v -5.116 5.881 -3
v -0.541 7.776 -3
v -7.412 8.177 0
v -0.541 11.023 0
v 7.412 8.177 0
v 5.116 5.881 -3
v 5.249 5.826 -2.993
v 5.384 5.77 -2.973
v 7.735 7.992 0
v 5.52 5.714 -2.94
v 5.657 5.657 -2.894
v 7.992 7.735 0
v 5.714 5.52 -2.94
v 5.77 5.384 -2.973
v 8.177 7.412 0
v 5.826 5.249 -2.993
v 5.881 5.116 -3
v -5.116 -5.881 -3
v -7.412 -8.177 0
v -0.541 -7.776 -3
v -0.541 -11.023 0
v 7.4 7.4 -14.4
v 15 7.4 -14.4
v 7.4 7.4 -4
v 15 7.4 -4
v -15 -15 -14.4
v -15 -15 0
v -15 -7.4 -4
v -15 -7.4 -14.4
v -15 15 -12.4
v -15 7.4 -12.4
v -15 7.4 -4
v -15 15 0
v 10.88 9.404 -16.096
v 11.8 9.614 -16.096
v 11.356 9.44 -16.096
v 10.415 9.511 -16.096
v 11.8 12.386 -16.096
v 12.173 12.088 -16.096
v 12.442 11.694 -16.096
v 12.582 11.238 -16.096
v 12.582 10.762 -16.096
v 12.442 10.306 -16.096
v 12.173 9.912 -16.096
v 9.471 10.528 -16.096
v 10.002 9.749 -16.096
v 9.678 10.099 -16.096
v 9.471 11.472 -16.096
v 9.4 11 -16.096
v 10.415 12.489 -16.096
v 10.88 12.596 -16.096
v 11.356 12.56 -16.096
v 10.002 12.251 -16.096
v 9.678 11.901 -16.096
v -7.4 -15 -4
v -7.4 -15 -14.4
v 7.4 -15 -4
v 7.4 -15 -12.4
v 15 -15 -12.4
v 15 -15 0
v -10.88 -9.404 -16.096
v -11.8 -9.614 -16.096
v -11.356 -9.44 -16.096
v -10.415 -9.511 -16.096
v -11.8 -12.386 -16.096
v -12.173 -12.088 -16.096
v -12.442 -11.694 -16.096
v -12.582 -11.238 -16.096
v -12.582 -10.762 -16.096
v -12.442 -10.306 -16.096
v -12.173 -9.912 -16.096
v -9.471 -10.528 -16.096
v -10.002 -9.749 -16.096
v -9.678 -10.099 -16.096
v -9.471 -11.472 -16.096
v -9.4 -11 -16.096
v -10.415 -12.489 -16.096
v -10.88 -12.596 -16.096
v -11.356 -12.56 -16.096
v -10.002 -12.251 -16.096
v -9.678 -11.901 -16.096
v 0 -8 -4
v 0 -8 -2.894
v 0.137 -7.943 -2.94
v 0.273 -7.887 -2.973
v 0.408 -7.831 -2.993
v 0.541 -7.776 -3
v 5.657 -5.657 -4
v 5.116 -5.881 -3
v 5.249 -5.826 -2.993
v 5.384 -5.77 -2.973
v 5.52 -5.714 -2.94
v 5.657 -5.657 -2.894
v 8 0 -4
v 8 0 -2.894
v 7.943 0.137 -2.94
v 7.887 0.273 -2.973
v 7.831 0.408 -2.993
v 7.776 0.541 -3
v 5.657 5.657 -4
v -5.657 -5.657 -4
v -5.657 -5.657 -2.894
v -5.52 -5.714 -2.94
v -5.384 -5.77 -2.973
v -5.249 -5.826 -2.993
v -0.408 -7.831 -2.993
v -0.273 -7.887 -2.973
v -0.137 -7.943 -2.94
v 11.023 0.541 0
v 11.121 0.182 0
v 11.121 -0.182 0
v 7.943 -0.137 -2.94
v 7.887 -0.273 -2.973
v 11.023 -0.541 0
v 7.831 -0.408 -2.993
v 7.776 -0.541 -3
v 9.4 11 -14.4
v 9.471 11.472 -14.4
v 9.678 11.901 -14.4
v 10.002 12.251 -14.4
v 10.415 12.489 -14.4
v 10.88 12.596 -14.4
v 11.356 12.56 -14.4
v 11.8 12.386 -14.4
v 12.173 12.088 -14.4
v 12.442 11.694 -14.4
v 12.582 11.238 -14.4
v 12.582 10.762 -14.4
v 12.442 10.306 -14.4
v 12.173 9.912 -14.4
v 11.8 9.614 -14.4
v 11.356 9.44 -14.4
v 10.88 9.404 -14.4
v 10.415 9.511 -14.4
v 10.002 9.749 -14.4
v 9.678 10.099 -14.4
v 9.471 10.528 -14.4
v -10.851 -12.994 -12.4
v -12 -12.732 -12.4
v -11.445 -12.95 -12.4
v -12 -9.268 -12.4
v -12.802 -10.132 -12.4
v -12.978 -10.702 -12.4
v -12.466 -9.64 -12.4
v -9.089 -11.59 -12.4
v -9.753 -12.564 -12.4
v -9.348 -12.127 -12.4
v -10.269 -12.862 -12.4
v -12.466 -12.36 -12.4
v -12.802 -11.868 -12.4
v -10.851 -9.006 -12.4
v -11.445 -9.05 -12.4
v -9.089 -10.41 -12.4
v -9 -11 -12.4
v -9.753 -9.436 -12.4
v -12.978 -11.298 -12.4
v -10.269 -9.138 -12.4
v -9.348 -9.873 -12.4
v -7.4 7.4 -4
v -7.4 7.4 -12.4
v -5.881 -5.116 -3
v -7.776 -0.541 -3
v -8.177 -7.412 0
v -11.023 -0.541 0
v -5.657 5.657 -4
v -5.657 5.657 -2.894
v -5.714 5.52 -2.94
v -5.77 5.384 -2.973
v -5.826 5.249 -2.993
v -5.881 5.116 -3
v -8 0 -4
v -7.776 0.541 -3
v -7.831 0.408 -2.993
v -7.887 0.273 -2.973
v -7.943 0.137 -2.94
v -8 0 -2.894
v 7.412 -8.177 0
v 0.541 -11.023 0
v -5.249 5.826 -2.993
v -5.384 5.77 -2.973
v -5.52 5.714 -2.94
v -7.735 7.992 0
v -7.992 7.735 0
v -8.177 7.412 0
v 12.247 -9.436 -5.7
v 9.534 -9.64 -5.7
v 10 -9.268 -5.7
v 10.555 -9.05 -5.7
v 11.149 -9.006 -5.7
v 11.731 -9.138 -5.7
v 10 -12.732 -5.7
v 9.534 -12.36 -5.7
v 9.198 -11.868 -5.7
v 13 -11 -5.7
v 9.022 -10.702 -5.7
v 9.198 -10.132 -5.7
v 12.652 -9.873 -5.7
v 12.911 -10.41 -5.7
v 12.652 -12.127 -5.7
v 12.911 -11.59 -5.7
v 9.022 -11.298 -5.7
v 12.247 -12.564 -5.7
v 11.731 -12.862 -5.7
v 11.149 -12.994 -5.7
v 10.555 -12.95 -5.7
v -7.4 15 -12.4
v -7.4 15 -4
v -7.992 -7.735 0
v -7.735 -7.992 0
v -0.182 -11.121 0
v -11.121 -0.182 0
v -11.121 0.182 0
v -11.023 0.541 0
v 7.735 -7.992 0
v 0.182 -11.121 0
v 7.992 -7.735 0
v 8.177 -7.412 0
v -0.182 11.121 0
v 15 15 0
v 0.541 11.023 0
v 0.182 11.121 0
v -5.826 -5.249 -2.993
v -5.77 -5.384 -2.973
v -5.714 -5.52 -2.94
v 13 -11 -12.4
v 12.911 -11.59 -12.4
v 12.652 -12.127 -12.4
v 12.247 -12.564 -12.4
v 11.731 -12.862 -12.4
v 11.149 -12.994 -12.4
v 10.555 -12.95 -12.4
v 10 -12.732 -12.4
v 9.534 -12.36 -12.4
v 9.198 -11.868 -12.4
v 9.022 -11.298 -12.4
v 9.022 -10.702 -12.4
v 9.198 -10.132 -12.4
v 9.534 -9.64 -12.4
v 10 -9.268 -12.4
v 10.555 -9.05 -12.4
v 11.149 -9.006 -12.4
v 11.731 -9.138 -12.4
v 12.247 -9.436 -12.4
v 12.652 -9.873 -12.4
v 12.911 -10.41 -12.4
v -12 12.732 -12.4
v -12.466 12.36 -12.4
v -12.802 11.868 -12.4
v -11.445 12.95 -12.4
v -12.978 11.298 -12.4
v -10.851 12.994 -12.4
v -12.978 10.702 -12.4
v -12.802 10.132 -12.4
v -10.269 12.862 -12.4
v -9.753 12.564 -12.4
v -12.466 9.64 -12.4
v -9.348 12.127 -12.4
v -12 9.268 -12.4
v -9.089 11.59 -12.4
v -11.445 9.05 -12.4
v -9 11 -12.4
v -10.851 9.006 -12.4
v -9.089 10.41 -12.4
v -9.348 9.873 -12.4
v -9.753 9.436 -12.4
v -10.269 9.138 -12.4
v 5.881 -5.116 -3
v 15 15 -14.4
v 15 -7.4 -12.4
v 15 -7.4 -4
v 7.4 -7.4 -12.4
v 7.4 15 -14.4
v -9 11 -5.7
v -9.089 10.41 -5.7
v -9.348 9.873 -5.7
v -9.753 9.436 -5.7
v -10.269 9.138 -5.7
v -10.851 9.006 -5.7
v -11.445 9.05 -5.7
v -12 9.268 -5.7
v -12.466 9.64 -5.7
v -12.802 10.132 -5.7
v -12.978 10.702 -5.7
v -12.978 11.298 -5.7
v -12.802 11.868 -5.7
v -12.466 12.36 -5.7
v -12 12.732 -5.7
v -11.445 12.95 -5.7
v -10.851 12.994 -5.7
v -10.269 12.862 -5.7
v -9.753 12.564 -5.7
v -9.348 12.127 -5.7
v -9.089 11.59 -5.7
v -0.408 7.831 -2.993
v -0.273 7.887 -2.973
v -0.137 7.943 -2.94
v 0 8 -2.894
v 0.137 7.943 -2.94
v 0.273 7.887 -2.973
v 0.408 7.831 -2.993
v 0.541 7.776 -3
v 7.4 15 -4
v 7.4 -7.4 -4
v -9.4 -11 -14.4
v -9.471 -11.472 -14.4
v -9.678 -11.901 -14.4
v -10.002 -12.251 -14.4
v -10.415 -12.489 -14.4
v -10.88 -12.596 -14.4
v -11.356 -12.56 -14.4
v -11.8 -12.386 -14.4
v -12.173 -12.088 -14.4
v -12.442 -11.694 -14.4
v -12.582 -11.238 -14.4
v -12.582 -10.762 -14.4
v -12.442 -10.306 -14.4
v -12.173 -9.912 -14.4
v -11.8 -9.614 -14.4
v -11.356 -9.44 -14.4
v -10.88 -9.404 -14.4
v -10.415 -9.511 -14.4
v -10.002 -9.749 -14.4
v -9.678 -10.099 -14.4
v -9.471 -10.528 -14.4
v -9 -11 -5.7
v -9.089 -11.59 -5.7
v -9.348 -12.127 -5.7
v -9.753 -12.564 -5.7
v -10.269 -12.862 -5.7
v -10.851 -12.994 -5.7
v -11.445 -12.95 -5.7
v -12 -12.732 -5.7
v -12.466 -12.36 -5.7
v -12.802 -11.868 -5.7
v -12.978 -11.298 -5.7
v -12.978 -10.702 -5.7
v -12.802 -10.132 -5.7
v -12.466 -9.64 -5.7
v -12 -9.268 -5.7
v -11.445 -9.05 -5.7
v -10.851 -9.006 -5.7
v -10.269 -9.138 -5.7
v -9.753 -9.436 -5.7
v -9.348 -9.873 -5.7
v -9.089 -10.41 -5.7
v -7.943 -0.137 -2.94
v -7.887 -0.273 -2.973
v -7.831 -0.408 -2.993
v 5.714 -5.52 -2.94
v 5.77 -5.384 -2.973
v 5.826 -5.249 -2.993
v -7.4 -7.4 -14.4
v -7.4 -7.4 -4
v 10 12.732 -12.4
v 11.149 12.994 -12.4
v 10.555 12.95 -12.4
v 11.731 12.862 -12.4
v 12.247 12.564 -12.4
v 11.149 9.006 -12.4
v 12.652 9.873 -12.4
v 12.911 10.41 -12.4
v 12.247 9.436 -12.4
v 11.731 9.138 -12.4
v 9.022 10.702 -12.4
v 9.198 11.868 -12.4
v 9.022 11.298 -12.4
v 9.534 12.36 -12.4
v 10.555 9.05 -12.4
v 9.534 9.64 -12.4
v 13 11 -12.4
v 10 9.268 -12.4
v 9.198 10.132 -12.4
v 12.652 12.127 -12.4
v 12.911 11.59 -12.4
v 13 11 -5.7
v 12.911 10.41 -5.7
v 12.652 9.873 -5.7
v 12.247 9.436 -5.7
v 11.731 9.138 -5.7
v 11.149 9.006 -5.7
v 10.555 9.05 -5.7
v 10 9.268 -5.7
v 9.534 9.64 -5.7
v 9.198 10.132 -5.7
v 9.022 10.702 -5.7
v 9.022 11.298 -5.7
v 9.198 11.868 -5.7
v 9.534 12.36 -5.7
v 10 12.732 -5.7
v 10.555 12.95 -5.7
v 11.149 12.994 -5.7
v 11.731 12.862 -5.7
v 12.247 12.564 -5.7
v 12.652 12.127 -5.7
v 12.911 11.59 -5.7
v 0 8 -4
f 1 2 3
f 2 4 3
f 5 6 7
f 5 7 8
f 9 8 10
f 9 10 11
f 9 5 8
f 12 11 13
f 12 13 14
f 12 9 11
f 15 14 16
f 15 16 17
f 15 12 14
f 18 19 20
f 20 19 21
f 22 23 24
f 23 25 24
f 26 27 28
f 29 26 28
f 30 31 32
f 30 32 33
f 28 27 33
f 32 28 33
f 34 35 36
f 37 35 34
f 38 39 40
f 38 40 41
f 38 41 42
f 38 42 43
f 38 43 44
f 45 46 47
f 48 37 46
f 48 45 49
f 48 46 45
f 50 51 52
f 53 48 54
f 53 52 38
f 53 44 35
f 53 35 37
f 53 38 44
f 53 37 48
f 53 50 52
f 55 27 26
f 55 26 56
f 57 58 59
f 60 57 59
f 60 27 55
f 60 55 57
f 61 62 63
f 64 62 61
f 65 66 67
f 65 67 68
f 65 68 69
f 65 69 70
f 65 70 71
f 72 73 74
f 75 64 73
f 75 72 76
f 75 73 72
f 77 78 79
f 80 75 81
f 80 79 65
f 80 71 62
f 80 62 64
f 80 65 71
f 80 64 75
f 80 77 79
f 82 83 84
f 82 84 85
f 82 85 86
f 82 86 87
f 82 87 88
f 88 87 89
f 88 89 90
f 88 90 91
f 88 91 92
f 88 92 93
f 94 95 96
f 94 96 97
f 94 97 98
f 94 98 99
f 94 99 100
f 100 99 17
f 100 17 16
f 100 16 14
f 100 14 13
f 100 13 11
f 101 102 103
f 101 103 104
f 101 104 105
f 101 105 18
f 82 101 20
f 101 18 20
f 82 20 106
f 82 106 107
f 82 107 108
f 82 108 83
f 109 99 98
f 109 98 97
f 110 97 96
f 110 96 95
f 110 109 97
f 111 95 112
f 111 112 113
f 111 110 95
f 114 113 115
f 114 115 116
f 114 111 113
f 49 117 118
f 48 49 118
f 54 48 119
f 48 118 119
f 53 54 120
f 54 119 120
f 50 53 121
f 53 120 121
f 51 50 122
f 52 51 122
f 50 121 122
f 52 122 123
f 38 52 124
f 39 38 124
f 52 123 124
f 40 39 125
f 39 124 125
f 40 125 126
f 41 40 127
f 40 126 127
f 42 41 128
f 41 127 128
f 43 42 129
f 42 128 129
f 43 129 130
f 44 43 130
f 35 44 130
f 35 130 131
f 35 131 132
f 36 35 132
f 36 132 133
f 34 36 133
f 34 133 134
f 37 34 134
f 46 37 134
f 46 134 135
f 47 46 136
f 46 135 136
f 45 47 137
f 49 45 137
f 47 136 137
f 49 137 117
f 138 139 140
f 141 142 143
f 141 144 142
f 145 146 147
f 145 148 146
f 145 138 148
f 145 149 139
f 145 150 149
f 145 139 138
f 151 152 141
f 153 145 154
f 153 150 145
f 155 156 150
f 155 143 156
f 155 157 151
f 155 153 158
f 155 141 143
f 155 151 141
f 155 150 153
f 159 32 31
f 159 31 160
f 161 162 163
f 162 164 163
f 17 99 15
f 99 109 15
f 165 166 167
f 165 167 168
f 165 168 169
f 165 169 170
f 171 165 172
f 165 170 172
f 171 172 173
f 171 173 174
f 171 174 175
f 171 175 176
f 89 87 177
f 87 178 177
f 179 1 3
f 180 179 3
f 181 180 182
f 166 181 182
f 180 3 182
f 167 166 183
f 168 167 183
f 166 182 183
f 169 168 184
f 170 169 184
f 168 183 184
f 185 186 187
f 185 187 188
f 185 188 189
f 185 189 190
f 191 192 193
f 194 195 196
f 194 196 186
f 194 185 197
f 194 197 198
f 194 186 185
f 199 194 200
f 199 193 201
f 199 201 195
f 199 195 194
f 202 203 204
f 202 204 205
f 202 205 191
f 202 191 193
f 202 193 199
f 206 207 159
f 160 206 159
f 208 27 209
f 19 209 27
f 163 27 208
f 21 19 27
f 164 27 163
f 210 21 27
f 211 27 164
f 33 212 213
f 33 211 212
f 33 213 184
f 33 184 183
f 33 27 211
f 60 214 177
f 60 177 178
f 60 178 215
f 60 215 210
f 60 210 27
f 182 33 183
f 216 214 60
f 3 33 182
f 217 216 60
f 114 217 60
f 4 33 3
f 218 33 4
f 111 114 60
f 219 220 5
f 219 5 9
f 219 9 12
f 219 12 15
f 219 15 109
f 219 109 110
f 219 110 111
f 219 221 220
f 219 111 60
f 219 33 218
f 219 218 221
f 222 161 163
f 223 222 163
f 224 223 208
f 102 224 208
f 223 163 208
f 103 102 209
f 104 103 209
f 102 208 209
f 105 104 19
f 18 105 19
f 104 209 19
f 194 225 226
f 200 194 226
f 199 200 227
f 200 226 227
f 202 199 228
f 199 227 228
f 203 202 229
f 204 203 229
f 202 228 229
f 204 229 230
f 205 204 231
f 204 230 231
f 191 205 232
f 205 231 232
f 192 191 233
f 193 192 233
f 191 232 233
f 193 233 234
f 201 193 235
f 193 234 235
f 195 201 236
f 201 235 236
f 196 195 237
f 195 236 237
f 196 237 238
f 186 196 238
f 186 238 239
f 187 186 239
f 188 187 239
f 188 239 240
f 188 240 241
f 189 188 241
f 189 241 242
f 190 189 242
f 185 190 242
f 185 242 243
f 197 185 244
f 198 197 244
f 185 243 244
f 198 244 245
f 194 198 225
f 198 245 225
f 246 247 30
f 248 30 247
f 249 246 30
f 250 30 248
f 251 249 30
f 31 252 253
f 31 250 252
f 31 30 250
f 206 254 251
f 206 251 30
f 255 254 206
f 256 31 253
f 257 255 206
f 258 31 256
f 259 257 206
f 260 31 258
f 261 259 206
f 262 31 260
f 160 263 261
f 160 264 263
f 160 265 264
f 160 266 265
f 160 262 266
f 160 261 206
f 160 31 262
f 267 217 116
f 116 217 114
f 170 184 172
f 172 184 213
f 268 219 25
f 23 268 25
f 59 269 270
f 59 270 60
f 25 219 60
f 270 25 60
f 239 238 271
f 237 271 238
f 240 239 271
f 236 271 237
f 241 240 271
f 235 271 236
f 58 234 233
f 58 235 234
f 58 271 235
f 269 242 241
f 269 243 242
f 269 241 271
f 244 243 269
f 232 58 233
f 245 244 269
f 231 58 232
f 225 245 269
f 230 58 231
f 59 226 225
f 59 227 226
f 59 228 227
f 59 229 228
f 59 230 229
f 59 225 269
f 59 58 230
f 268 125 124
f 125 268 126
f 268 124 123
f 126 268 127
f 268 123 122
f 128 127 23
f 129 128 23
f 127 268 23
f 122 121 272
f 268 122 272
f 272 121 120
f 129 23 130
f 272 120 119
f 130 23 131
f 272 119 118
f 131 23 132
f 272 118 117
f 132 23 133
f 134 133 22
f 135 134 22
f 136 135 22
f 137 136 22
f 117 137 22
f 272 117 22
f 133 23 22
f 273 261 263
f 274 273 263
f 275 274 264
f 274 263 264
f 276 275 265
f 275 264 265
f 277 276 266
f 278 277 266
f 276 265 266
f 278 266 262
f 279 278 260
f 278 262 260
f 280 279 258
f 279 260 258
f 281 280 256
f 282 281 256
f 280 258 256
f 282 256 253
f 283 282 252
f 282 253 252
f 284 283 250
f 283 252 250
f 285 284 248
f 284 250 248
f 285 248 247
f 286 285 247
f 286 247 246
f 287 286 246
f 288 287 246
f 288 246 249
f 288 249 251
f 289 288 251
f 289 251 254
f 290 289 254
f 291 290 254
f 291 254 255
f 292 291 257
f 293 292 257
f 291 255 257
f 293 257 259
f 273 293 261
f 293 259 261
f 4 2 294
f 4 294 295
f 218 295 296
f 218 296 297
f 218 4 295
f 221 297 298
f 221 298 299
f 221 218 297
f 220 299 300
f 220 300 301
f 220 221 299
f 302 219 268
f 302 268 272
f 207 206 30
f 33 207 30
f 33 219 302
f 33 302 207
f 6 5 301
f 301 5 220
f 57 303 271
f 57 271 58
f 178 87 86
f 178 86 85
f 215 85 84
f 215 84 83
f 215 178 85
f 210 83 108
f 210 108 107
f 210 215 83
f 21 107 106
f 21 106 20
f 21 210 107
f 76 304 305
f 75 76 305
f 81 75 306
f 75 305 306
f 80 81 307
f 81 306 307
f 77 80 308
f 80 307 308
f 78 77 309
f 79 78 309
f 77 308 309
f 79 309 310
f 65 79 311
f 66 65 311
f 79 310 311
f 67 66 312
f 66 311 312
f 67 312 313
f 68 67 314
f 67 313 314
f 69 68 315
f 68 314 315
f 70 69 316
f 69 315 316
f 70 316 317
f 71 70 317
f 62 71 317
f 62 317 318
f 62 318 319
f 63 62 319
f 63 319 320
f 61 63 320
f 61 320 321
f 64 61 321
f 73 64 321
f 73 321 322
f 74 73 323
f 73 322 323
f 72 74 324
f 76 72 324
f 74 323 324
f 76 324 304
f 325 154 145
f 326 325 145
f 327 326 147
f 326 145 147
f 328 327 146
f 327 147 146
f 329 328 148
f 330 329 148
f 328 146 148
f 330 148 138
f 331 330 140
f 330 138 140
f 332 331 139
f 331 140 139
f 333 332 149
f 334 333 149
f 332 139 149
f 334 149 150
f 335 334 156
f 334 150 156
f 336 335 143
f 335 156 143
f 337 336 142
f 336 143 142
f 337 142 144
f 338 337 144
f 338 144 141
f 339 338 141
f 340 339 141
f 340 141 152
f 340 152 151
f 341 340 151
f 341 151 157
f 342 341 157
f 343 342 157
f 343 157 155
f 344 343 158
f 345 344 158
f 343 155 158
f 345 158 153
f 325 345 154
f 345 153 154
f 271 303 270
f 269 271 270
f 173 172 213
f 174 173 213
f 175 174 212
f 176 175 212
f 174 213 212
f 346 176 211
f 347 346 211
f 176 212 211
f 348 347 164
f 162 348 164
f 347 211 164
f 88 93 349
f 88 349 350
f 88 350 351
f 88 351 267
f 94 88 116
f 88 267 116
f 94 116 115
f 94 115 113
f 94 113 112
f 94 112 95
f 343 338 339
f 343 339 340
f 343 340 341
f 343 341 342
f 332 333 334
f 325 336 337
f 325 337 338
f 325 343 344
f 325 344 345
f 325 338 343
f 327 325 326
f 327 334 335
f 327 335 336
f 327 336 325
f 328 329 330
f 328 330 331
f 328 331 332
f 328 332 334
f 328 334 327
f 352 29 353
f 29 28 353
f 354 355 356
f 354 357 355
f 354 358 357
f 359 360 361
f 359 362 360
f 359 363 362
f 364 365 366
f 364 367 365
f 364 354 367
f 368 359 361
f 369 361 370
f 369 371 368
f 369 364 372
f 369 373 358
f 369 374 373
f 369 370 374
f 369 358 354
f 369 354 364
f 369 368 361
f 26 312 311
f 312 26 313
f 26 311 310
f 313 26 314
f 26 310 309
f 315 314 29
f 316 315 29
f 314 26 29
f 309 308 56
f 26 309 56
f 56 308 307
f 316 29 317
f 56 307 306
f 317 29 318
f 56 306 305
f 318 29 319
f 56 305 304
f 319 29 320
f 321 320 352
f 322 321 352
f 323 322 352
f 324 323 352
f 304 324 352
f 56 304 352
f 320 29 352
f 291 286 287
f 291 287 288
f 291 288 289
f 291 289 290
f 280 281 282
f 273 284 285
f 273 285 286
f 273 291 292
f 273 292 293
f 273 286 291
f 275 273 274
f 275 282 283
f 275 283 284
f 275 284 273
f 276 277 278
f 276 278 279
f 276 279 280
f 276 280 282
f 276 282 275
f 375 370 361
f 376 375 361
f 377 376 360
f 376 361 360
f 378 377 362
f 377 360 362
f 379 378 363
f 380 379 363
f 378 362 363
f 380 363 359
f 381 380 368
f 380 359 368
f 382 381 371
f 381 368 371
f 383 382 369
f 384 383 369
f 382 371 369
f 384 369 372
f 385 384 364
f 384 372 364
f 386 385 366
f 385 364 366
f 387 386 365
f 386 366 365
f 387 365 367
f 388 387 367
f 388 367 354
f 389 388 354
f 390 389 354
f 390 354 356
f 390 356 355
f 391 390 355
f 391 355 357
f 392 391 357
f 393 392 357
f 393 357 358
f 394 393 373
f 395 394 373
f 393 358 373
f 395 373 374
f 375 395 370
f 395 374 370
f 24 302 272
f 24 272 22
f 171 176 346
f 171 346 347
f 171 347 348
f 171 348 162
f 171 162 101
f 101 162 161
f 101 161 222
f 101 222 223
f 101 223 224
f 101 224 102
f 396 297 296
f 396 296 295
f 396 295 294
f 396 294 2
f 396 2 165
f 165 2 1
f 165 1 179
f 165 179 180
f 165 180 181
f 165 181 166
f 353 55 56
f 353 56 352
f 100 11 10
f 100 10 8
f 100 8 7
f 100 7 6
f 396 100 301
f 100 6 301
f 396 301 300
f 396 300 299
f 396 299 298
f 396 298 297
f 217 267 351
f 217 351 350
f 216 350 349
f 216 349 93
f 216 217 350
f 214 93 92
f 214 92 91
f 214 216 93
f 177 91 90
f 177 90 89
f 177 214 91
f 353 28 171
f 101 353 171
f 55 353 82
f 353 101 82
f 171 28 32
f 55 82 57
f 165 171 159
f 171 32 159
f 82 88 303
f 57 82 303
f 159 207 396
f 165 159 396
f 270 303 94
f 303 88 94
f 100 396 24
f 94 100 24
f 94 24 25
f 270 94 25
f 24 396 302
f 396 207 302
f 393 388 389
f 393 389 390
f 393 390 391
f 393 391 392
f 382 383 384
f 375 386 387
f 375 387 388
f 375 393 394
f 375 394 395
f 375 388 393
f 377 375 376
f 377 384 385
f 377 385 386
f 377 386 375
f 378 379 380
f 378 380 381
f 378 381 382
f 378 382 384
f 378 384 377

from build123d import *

# Parameters (mm, degrees)
SKETCH023_W             = 7.6
SKETCH023_H             = 7.6
PAD012_DEPTH            = 2
SKETCH024_R             = 1.6
PAD013_DEPTH            = 1.696
BODY042_PLACEMENT_ANGLE = 180
SKETCH020_W             = 30
SKETCH020_H             = 30
PAD010_DEPTH            = 4
CHAMFER_SIZE            = 3
FILLET011_R             = 2
SKETCH021_W             = 7.6
SKETCH021_H             = 7.6
PAD011_DEPTH            = 8.4
SKETCH022_R             = 2
POCKET004_DEPTH         = 6.7


with BuildPart() as f_3dprintstand:
    # Sketch023 → Pad012 (new body)
    with BuildSketch(Plane.XY):
        with Locations((-11.2, -11.2)):
            Rectangle(SKETCH023_W, SKETCH023_H)
    extrude(amount=-PAD012_DEPTH)

    # Sketch024 (on Face6 of Pad012) → Pad013 (join)
    with BuildSketch(Plane(origin=(0, 0, -2), x_dir=(1, 0, 0), z_dir=(0, 0, -1))):
        with Locations((-11, 11)):
            Circle(SKETCH024_R)
    extrude(amount=PAD013_DEPTH)


with BuildPart() as f_3dprintstand_1:
    # Body029 placement: moved
    add(f_3dprintstand.part.moved(Location((0, 0, -12.4))))


with BuildPart() as fusion_3dprintstand:
    # Body043 base: copy of 3DPrintStand
    add(f_3dprintstand_1.part)


with BuildPart() as body044:
    # Body042 base: copy of 3DPrintStand
    add(f_3dprintstand_1.part)


with BuildPart() as body044_1:
    # Body042 placement: moved
    add(body044.part.rotate(Axis((0, 0, 0), (0, 0, 1)), BODY042_PLACEMENT_ANGLE))


with BuildPart() as fusion_sockettop:
    # Sketch020 → Pad010 (new body)
    with BuildSketch(Plane.XY):
        Rectangle(SKETCH020_W, SKETCH020_H)
        Polygon((0, 8), (-5.656854, 5.656854), (-8, 0), (-5.656854, -5.656854), (0, -8), (5.656854, -5.656854), (8, 0), (5.656854, 5.656854), align=None, mode=Mode.SUBTRACT)
    extrude(amount=-PAD010_DEPTH)

    # Chamfer
    chamfer_edges = [fusion_sockettop.edges().sort_by_distance(p)[0] for p in [
        (2.828427, 6.828427, 0),
        (6.828427, 2.828427, 0),
        (6.828427, -2.828427, 0),
        (2.828427, -6.828427, 0),
        (-2.828427, -6.828427, 0),
        (-6.828427, -2.828427, 0),
        (-6.828427, 2.828427, 0),
        (-2.828427, 6.828427, 0),
    ]]
    chamfer(chamfer_edges, length=CHAMFER_SIZE)

    # Fillet011
    fillet011_edges = [fusion_sockettop.edges().sort_by_distance(p)[0] for p in [
        (-6.804905, 6.804905, -1.5),
        (0, 9.623588, -1.5),
        (6.804905, 6.804905, -1.5),
        (9.623588, 0, -1.5),
        (-6.804905, -6.804905, -1.5),
        (-9.623588, 0, -1.5),
        (0, -9.623588, -1.5),
        (6.804905, -6.804905, -1.5),
    ]]
    fillet(fillet011_edges, radius=FILLET011_R)

    # Sketch021 (on Face4 of Fillet011) → Pad011 (join)
    with BuildSketch(Plane(origin=(0, 0, -4), x_dir=(1, 0, 0), z_dir=(0, 0, -1))):
        with Locations((-11.2, -11.2)):
            Rectangle(SKETCH021_W, SKETCH021_H)
        with Locations((11.2, -11.2)):
            Rectangle(SKETCH021_W, SKETCH021_H)
        with Locations((11.2, 11.2)):
            Rectangle(SKETCH021_W, SKETCH021_H)
        with Locations((-11.2, 11.2)):
            Rectangle(SKETCH021_W, SKETCH021_H)
    extrude(amount=PAD011_DEPTH)

    # Sketch022 (on Face43 of Pad011) → Pocket004 (cut)
    with BuildSketch(Plane(origin=(0, 0, -12.4), x_dir=(1, 0, 0), z_dir=(0, 0, -1))):
        with Locations((-11, 11)):
            Circle(SKETCH022_R)
        with Locations((11, 11)):
            Circle(SKETCH022_R)
        with Locations((11, -11)):
            Circle(SKETCH022_R)
        with Locations((-11, -11)):
            Circle(SKETCH022_R)
    extrude(amount=-POCKET004_DEPTH, mode=Mode.SUBTRACT)

    # Boolean003: union Fusion_3DPrintStand, Body044
    add(fusion_3dprintstand.part)
    add(body044_1.part)


solid = fusion_sockettop.part
